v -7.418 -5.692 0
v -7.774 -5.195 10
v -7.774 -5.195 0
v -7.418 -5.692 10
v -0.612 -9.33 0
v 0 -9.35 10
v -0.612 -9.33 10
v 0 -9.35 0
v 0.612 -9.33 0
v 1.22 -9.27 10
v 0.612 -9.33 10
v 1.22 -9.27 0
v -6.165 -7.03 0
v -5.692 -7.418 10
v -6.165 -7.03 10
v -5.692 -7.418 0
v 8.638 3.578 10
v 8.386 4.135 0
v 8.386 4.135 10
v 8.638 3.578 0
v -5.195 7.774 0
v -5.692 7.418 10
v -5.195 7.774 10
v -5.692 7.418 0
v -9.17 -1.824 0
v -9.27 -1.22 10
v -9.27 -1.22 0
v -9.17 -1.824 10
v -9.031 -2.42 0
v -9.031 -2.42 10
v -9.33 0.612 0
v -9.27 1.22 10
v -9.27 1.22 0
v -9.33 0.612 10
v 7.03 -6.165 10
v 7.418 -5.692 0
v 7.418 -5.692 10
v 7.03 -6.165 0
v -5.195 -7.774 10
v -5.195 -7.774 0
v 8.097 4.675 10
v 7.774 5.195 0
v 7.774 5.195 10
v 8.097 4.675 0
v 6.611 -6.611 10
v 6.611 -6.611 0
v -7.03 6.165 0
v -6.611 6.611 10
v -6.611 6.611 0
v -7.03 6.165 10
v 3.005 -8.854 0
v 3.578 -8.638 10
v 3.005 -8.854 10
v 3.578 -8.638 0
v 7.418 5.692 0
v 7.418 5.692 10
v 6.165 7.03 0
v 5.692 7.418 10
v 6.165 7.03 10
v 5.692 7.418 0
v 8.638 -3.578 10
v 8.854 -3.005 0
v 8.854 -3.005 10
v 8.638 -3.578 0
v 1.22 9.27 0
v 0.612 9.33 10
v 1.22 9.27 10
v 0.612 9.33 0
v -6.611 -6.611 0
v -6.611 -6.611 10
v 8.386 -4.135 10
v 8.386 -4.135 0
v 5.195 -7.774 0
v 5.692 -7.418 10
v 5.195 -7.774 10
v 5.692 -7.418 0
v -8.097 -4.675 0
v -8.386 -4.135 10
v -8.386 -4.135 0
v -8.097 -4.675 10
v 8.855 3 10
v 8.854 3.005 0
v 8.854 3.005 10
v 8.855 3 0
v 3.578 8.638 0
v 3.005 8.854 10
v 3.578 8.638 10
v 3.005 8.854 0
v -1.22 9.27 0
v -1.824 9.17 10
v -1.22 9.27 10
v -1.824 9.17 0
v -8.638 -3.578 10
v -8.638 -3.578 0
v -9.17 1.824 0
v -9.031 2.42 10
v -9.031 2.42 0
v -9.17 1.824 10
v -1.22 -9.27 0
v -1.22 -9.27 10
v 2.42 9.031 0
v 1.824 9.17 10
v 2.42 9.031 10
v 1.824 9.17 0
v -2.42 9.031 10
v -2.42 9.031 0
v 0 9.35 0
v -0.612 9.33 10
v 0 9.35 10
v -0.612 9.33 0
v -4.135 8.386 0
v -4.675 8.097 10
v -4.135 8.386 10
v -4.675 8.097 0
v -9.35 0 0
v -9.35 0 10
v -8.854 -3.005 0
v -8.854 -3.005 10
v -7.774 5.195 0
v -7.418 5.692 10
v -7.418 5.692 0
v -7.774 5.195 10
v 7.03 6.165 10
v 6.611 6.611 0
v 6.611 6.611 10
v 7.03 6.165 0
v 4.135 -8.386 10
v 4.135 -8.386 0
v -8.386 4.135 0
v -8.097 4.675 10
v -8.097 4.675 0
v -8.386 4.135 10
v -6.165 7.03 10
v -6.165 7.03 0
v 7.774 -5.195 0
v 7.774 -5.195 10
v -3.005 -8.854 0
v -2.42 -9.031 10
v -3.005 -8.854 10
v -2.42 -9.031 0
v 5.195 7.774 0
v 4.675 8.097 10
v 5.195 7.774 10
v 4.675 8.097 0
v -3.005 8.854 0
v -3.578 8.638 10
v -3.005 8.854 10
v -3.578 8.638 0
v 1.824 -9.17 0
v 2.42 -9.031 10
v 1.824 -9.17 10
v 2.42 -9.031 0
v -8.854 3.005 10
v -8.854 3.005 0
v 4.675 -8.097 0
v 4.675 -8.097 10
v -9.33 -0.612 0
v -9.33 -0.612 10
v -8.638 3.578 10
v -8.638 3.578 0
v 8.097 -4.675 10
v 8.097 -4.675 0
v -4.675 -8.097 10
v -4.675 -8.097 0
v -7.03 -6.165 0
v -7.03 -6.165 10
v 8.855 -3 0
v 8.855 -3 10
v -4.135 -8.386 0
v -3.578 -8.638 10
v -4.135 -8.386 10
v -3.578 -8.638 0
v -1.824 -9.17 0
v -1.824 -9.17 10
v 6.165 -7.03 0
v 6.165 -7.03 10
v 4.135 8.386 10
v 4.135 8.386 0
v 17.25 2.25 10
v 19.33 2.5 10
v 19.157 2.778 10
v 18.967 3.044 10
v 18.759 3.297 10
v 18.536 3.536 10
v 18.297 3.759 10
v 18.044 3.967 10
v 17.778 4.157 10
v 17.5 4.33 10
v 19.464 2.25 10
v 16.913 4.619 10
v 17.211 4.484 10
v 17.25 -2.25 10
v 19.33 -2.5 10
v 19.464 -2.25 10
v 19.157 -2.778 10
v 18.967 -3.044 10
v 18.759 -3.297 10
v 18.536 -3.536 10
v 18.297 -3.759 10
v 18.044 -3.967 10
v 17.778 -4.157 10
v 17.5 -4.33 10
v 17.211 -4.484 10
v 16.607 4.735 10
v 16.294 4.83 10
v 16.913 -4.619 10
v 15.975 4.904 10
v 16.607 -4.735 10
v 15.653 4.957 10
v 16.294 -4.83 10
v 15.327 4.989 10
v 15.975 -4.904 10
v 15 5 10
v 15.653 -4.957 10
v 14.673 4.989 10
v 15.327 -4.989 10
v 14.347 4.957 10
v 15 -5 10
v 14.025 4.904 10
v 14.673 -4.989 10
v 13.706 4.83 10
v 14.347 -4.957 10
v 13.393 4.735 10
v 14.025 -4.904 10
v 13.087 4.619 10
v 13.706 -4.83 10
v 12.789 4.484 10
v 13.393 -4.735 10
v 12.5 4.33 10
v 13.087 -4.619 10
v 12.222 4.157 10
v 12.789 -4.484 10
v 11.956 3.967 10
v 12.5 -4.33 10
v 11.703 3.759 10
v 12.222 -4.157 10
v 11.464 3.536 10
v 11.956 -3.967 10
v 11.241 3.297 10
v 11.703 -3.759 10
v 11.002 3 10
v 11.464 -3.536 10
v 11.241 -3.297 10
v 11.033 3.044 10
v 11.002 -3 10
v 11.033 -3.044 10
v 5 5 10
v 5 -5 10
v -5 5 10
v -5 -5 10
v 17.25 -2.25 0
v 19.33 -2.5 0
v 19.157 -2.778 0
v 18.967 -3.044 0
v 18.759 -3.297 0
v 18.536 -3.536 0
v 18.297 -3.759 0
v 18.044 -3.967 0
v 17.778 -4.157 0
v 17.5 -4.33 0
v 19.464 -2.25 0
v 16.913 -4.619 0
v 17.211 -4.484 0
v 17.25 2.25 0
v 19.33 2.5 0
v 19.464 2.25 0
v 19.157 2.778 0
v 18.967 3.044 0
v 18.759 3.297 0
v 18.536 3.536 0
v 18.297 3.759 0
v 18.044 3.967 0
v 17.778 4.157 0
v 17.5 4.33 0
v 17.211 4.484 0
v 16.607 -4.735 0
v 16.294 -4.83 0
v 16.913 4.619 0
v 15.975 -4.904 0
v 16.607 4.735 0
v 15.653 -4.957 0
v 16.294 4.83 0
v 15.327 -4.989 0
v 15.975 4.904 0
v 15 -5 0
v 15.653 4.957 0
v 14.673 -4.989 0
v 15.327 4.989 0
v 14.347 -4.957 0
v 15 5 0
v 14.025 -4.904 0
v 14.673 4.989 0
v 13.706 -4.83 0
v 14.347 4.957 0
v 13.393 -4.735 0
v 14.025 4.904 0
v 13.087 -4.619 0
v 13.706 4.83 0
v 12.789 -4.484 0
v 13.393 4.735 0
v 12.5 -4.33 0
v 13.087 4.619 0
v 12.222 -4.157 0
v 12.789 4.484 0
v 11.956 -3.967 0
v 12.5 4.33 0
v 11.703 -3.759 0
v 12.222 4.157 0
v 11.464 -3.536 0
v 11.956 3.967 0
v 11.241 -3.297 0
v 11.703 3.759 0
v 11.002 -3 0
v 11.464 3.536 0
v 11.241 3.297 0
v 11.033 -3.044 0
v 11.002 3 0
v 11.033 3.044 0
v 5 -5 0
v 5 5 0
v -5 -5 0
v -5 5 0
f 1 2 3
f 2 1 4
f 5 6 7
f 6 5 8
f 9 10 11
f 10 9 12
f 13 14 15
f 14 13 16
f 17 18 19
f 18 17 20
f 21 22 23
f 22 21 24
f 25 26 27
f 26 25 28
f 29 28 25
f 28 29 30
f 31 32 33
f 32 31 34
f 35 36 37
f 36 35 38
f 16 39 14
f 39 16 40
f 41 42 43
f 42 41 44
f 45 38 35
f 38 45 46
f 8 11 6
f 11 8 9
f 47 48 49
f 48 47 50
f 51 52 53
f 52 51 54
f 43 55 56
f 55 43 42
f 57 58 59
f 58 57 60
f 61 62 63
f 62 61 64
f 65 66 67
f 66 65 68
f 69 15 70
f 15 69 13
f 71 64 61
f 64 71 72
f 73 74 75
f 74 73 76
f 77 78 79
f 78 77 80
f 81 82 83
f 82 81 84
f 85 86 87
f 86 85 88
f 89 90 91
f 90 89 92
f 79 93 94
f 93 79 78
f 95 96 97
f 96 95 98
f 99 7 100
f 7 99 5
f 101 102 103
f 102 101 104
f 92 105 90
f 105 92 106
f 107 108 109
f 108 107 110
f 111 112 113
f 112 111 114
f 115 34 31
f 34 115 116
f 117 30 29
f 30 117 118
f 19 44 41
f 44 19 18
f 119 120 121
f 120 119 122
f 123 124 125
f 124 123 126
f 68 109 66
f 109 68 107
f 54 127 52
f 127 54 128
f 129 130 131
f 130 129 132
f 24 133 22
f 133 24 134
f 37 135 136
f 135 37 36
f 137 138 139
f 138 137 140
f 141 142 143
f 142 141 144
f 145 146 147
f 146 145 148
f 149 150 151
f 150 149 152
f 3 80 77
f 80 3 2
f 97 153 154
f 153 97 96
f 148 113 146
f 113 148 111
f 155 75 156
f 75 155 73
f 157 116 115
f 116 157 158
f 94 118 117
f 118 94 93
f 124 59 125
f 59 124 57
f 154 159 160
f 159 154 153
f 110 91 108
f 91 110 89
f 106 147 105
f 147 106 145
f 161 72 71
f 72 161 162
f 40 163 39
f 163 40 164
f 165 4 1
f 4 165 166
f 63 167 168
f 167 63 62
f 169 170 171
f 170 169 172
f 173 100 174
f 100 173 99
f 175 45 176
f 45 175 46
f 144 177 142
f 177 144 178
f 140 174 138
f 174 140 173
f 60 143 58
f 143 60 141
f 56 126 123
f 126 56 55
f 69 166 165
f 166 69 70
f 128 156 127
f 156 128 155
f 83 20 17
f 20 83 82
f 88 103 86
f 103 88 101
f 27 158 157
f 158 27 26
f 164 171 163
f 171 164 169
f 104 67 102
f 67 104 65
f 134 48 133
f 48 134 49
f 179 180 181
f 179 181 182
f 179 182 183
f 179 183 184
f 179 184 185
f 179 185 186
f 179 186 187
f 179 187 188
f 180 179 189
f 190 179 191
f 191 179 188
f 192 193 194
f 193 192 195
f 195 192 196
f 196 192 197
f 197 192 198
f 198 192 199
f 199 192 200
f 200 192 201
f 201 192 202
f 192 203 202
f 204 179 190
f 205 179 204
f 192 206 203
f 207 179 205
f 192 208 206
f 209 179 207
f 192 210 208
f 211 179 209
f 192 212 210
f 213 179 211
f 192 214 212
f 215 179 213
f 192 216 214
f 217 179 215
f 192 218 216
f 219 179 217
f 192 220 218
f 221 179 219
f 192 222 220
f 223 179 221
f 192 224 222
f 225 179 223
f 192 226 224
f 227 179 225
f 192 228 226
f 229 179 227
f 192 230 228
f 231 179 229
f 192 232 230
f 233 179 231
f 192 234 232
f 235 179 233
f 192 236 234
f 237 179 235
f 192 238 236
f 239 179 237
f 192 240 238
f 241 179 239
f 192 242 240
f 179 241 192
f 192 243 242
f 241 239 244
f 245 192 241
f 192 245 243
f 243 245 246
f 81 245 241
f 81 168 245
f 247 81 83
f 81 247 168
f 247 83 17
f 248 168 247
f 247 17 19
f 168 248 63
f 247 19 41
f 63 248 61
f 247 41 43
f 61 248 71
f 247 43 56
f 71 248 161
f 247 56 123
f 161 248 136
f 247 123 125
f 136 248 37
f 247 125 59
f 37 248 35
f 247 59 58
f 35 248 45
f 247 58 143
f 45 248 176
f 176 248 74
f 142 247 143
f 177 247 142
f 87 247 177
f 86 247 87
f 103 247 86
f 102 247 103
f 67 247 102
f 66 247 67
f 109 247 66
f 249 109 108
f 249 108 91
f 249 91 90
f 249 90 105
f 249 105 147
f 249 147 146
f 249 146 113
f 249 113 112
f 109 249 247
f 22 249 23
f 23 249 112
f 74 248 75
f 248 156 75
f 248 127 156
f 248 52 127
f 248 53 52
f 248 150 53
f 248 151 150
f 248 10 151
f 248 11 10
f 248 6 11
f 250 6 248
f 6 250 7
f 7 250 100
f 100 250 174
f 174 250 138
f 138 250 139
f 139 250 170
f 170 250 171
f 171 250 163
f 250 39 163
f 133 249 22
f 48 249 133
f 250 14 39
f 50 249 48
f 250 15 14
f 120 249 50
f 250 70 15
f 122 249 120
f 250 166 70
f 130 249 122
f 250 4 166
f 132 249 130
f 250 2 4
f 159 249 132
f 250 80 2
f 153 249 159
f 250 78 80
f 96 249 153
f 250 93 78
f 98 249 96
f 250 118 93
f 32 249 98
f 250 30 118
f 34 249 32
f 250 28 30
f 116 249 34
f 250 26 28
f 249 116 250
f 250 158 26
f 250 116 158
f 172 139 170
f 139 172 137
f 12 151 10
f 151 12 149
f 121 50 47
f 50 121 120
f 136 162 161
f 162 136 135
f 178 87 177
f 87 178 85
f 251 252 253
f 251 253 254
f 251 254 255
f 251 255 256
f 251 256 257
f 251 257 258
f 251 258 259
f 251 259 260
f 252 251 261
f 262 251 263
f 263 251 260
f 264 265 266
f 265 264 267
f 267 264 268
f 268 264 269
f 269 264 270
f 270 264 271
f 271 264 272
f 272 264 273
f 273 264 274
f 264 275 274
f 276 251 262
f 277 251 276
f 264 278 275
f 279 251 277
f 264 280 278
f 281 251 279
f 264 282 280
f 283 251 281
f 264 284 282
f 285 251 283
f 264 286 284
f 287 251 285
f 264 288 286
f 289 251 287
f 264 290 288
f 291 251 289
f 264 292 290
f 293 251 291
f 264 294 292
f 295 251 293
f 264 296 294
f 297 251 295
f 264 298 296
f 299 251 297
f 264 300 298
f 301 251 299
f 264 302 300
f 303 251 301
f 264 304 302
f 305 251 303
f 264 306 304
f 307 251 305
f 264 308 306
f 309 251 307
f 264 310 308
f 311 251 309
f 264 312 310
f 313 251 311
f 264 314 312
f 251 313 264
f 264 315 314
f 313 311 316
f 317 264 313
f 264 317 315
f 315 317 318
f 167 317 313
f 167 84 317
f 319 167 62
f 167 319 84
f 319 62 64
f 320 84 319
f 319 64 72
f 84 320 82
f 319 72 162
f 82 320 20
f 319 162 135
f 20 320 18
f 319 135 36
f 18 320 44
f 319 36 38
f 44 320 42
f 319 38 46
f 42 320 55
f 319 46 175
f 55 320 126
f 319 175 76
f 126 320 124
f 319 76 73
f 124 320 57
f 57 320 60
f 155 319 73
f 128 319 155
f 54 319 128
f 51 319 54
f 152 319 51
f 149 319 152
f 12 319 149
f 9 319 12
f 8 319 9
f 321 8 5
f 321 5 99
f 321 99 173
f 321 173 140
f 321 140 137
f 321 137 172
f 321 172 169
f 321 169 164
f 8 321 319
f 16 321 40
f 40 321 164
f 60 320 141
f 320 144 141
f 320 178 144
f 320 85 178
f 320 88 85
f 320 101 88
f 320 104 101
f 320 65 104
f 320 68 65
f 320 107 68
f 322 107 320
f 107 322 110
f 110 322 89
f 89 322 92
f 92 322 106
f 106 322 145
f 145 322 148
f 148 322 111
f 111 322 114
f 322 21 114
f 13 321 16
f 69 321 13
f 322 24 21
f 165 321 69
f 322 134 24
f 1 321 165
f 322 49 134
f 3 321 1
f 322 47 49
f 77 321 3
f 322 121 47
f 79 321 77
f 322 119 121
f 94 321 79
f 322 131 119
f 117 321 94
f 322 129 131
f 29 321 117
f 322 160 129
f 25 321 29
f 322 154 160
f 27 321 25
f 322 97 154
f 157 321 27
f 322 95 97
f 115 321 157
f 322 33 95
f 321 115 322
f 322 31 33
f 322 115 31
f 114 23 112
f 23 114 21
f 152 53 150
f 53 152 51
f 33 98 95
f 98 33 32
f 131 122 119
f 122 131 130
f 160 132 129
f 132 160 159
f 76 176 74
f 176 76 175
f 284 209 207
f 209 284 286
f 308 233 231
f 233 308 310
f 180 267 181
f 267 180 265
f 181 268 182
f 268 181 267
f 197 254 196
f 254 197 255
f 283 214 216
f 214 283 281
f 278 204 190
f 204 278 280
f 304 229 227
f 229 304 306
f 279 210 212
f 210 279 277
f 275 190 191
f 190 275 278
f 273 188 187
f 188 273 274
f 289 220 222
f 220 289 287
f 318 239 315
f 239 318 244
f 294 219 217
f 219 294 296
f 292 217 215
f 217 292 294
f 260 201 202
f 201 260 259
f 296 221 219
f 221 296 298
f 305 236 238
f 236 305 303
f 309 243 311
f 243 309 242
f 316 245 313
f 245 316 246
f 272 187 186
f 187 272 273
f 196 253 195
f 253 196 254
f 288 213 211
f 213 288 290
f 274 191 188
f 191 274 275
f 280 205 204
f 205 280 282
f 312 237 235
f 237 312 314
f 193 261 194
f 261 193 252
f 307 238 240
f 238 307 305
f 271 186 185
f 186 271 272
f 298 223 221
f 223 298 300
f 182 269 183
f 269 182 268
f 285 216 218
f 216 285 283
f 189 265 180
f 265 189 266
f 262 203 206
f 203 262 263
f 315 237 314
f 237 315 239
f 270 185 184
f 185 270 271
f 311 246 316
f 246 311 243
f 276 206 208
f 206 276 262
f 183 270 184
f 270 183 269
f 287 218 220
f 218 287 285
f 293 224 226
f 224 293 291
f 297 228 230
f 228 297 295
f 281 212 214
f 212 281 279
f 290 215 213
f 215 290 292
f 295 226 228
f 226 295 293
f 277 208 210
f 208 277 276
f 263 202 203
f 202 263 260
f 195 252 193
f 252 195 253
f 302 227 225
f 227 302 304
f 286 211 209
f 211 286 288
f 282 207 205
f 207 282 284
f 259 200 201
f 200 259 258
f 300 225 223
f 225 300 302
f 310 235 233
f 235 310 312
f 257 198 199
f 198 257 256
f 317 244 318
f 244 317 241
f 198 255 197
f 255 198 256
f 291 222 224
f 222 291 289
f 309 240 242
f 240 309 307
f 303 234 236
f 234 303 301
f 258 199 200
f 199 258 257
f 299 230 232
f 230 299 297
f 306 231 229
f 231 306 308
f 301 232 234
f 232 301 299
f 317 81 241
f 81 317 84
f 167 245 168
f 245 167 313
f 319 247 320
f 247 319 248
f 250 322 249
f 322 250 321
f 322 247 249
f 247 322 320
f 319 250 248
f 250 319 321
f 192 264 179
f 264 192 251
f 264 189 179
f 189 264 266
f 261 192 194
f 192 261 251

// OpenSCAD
// Lab stand rod clip - printed flat, extruded in Z
// Units: mm

$fn = 96;

// --- Dimensions ---
rod_id      = 12.7;   // stand rod inner diameter
rod_wall    = 3;      // rod ring wall thickness
rod_od      = rod_id + 2 * rod_wall;  // rod ring outer diameter (18.7)
rod_opening = 10;     // width of opening cut from -X side

tub_id      = 6;      // tubing inner diameter
tub_wall    = 2;      // tubing ring wall thickness
tub_od      = tub_id + 2 * tub_wall;  // tubing ring outer diameter (10)
tub_x       = 15;     // tubing ring centre X
tub_opening = 4.5;    // width of opening cut from +X side

bridge_w    = 6;      // bridge width along Y
bridge_x1   = 8;      // bridge start X
bridge_x2   = 12;     // bridge end X

height      = 10;     // extrusion height in Z
eps         = 0.5;    // cutter overshoot past faces

// --- Model ---
difference() {
    union() {
        // Rod ring
        cylinder(d = rod_od, h = height);
        // Tubing ring
        translate([tub_x, 0, 0])
            cylinder(d = tub_od, h = height);
        // Solid bridge
        translate([bridge_x1, -bridge_w / 2, 0])
            cube([bridge_x2 - bridge_x1, bridge_w, height]);
    }
    // Rod ring opening (x < 0, -5 < y < 5)
    translate([-rod_opening / 2, -rod_opening / 2, -eps])
        cube([rod_opening, rod_opening, height + 2 * eps]);
    // Tubing ring opening (x > 15, -2.25 < y < 2.25)
    translate([tub_x + tub_opening / 2, -tub_opening / 2, -eps])
        cube([tub_opening, tub_opening, height + 2 * eps]);
}
